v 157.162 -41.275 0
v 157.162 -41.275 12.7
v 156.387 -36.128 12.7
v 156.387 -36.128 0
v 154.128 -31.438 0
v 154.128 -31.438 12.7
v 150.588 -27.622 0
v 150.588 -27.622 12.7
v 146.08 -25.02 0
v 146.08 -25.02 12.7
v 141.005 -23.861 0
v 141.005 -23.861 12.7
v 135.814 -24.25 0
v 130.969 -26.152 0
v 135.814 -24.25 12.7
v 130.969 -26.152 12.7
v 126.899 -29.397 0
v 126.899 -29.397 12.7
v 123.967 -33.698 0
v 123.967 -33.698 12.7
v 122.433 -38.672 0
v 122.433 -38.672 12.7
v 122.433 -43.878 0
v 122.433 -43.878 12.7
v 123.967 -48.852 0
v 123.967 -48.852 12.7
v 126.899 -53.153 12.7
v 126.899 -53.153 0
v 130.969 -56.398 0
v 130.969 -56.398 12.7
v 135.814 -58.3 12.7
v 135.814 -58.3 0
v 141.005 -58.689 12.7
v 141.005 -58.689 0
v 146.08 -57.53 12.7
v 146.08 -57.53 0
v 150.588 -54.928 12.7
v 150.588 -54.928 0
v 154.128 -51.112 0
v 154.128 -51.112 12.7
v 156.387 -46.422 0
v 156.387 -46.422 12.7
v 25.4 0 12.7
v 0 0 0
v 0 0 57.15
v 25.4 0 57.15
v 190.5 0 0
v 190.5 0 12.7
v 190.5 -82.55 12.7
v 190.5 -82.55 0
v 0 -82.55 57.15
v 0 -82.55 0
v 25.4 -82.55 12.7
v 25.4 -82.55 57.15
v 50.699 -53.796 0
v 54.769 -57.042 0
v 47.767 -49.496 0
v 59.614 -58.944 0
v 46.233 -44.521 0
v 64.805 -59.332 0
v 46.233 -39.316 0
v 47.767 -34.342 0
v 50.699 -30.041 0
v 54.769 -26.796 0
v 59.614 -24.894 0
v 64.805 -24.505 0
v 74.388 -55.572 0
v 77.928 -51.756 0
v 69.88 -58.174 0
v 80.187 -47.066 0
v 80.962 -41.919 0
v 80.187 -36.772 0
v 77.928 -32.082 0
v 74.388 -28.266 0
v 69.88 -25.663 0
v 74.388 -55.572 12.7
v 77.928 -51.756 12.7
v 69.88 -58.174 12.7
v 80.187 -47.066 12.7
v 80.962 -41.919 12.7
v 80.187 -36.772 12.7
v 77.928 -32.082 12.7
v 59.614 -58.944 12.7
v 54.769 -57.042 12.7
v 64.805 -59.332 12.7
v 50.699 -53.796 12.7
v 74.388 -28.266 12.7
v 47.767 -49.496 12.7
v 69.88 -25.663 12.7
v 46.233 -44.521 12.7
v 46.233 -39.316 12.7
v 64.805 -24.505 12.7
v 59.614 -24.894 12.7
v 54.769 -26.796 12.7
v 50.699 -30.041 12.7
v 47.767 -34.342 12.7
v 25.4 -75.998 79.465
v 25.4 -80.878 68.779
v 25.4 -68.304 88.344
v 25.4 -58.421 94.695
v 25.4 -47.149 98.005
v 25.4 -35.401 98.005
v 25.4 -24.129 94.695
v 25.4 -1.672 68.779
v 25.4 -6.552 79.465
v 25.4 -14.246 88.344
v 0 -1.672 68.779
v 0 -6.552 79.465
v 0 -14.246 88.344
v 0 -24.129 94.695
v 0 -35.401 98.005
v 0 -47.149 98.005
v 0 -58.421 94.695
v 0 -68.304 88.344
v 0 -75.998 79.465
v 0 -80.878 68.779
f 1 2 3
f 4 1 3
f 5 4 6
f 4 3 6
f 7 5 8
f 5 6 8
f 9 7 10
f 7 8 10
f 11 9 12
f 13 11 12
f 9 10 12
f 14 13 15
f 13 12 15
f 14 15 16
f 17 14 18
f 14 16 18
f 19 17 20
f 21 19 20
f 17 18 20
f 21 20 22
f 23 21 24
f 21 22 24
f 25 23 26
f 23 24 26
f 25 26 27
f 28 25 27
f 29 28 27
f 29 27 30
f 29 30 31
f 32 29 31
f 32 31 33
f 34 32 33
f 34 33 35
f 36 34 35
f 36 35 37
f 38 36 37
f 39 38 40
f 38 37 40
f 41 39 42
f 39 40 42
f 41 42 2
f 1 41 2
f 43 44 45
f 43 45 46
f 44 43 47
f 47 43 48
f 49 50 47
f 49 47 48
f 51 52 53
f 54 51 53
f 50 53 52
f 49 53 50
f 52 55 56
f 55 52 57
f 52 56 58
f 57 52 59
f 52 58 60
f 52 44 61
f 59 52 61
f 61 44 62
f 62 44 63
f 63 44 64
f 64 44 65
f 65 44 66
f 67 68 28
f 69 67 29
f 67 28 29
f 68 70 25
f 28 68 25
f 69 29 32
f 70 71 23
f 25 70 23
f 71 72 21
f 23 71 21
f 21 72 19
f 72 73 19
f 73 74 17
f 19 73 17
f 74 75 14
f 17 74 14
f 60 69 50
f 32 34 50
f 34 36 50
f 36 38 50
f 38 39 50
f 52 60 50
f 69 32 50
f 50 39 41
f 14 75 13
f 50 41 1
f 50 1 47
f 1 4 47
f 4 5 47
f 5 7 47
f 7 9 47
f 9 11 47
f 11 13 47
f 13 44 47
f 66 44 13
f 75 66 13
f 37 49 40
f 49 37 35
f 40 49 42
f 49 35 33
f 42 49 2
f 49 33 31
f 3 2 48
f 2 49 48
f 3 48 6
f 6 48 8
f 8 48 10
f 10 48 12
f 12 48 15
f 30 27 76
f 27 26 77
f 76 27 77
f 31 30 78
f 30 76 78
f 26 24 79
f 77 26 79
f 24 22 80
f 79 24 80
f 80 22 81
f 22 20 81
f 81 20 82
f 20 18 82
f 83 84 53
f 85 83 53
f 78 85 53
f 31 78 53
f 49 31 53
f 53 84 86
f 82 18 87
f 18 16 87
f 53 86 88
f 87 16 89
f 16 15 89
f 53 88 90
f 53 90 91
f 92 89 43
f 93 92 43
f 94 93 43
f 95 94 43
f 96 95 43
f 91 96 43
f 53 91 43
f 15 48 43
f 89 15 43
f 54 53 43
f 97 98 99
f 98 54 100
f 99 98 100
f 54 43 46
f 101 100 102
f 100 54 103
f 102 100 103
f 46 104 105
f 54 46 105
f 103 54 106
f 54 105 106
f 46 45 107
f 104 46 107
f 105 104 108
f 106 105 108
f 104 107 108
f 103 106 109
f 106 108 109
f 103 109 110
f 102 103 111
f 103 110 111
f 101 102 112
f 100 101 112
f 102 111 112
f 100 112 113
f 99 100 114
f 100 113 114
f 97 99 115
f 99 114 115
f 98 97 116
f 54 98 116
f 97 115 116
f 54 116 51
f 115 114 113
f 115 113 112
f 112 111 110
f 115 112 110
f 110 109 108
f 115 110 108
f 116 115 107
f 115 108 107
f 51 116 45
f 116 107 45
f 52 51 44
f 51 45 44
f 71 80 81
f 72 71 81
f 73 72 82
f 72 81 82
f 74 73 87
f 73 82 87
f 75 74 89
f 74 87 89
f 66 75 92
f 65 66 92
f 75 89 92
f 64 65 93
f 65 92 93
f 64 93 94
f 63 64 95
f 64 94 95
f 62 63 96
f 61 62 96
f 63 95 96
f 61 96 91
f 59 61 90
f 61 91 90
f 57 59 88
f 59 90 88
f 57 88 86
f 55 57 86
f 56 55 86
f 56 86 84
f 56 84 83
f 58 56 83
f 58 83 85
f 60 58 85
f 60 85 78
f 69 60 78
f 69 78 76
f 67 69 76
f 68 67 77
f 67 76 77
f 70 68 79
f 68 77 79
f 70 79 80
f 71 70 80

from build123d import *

# Parameters (mm, degrees)
F1_DEPTH = 82.55
F3_DEPTH = 25.4
F4_R     = 17.4625
F5_DEPTH = 12.7


with BuildPart() as f1:
    # F0 (on Front) → F1 (new body)
    with BuildSketch(Plane.XZ):
        Polygon((0, 127), (0, 0), (190.5, 0), (190.5, 12.7), (25.4, 12.7), (25.4, 127), align=None)
    extrude(amount=F1_DEPTH)

    # F2 (on face) → F3 (cut)
    with BuildSketch(Plane(origin=(0, 0, 0), x_dir=(0, -1, 0), z_dir=(-1, 0, 0))):
        with BuildLine():
            Line((0, 127), (0, 57.15))
            ThreePointArc((0, 57.15), (41.275, 98.425), (82.55, 57.15))
            Line((82.55, 57.15), (82.55, 127))
            Line((82.55, 127), (0, 127))
        make_face()
    extrude(amount=-F3_DEPTH, mode=Mode.SUBTRACT)

    # F4 (on face) → F5 (cut)
    with BuildSketch(Plane.XY.offset(12.7)):
        with Locations((63.5, -41.918826)):
            Circle(F4_R)
        with Locations((139.7, -41.275)):
            Circle(F4_R)
    extrude(amount=-F5_DEPTH, mode=Mode.SUBTRACT)


solid = f1.part
